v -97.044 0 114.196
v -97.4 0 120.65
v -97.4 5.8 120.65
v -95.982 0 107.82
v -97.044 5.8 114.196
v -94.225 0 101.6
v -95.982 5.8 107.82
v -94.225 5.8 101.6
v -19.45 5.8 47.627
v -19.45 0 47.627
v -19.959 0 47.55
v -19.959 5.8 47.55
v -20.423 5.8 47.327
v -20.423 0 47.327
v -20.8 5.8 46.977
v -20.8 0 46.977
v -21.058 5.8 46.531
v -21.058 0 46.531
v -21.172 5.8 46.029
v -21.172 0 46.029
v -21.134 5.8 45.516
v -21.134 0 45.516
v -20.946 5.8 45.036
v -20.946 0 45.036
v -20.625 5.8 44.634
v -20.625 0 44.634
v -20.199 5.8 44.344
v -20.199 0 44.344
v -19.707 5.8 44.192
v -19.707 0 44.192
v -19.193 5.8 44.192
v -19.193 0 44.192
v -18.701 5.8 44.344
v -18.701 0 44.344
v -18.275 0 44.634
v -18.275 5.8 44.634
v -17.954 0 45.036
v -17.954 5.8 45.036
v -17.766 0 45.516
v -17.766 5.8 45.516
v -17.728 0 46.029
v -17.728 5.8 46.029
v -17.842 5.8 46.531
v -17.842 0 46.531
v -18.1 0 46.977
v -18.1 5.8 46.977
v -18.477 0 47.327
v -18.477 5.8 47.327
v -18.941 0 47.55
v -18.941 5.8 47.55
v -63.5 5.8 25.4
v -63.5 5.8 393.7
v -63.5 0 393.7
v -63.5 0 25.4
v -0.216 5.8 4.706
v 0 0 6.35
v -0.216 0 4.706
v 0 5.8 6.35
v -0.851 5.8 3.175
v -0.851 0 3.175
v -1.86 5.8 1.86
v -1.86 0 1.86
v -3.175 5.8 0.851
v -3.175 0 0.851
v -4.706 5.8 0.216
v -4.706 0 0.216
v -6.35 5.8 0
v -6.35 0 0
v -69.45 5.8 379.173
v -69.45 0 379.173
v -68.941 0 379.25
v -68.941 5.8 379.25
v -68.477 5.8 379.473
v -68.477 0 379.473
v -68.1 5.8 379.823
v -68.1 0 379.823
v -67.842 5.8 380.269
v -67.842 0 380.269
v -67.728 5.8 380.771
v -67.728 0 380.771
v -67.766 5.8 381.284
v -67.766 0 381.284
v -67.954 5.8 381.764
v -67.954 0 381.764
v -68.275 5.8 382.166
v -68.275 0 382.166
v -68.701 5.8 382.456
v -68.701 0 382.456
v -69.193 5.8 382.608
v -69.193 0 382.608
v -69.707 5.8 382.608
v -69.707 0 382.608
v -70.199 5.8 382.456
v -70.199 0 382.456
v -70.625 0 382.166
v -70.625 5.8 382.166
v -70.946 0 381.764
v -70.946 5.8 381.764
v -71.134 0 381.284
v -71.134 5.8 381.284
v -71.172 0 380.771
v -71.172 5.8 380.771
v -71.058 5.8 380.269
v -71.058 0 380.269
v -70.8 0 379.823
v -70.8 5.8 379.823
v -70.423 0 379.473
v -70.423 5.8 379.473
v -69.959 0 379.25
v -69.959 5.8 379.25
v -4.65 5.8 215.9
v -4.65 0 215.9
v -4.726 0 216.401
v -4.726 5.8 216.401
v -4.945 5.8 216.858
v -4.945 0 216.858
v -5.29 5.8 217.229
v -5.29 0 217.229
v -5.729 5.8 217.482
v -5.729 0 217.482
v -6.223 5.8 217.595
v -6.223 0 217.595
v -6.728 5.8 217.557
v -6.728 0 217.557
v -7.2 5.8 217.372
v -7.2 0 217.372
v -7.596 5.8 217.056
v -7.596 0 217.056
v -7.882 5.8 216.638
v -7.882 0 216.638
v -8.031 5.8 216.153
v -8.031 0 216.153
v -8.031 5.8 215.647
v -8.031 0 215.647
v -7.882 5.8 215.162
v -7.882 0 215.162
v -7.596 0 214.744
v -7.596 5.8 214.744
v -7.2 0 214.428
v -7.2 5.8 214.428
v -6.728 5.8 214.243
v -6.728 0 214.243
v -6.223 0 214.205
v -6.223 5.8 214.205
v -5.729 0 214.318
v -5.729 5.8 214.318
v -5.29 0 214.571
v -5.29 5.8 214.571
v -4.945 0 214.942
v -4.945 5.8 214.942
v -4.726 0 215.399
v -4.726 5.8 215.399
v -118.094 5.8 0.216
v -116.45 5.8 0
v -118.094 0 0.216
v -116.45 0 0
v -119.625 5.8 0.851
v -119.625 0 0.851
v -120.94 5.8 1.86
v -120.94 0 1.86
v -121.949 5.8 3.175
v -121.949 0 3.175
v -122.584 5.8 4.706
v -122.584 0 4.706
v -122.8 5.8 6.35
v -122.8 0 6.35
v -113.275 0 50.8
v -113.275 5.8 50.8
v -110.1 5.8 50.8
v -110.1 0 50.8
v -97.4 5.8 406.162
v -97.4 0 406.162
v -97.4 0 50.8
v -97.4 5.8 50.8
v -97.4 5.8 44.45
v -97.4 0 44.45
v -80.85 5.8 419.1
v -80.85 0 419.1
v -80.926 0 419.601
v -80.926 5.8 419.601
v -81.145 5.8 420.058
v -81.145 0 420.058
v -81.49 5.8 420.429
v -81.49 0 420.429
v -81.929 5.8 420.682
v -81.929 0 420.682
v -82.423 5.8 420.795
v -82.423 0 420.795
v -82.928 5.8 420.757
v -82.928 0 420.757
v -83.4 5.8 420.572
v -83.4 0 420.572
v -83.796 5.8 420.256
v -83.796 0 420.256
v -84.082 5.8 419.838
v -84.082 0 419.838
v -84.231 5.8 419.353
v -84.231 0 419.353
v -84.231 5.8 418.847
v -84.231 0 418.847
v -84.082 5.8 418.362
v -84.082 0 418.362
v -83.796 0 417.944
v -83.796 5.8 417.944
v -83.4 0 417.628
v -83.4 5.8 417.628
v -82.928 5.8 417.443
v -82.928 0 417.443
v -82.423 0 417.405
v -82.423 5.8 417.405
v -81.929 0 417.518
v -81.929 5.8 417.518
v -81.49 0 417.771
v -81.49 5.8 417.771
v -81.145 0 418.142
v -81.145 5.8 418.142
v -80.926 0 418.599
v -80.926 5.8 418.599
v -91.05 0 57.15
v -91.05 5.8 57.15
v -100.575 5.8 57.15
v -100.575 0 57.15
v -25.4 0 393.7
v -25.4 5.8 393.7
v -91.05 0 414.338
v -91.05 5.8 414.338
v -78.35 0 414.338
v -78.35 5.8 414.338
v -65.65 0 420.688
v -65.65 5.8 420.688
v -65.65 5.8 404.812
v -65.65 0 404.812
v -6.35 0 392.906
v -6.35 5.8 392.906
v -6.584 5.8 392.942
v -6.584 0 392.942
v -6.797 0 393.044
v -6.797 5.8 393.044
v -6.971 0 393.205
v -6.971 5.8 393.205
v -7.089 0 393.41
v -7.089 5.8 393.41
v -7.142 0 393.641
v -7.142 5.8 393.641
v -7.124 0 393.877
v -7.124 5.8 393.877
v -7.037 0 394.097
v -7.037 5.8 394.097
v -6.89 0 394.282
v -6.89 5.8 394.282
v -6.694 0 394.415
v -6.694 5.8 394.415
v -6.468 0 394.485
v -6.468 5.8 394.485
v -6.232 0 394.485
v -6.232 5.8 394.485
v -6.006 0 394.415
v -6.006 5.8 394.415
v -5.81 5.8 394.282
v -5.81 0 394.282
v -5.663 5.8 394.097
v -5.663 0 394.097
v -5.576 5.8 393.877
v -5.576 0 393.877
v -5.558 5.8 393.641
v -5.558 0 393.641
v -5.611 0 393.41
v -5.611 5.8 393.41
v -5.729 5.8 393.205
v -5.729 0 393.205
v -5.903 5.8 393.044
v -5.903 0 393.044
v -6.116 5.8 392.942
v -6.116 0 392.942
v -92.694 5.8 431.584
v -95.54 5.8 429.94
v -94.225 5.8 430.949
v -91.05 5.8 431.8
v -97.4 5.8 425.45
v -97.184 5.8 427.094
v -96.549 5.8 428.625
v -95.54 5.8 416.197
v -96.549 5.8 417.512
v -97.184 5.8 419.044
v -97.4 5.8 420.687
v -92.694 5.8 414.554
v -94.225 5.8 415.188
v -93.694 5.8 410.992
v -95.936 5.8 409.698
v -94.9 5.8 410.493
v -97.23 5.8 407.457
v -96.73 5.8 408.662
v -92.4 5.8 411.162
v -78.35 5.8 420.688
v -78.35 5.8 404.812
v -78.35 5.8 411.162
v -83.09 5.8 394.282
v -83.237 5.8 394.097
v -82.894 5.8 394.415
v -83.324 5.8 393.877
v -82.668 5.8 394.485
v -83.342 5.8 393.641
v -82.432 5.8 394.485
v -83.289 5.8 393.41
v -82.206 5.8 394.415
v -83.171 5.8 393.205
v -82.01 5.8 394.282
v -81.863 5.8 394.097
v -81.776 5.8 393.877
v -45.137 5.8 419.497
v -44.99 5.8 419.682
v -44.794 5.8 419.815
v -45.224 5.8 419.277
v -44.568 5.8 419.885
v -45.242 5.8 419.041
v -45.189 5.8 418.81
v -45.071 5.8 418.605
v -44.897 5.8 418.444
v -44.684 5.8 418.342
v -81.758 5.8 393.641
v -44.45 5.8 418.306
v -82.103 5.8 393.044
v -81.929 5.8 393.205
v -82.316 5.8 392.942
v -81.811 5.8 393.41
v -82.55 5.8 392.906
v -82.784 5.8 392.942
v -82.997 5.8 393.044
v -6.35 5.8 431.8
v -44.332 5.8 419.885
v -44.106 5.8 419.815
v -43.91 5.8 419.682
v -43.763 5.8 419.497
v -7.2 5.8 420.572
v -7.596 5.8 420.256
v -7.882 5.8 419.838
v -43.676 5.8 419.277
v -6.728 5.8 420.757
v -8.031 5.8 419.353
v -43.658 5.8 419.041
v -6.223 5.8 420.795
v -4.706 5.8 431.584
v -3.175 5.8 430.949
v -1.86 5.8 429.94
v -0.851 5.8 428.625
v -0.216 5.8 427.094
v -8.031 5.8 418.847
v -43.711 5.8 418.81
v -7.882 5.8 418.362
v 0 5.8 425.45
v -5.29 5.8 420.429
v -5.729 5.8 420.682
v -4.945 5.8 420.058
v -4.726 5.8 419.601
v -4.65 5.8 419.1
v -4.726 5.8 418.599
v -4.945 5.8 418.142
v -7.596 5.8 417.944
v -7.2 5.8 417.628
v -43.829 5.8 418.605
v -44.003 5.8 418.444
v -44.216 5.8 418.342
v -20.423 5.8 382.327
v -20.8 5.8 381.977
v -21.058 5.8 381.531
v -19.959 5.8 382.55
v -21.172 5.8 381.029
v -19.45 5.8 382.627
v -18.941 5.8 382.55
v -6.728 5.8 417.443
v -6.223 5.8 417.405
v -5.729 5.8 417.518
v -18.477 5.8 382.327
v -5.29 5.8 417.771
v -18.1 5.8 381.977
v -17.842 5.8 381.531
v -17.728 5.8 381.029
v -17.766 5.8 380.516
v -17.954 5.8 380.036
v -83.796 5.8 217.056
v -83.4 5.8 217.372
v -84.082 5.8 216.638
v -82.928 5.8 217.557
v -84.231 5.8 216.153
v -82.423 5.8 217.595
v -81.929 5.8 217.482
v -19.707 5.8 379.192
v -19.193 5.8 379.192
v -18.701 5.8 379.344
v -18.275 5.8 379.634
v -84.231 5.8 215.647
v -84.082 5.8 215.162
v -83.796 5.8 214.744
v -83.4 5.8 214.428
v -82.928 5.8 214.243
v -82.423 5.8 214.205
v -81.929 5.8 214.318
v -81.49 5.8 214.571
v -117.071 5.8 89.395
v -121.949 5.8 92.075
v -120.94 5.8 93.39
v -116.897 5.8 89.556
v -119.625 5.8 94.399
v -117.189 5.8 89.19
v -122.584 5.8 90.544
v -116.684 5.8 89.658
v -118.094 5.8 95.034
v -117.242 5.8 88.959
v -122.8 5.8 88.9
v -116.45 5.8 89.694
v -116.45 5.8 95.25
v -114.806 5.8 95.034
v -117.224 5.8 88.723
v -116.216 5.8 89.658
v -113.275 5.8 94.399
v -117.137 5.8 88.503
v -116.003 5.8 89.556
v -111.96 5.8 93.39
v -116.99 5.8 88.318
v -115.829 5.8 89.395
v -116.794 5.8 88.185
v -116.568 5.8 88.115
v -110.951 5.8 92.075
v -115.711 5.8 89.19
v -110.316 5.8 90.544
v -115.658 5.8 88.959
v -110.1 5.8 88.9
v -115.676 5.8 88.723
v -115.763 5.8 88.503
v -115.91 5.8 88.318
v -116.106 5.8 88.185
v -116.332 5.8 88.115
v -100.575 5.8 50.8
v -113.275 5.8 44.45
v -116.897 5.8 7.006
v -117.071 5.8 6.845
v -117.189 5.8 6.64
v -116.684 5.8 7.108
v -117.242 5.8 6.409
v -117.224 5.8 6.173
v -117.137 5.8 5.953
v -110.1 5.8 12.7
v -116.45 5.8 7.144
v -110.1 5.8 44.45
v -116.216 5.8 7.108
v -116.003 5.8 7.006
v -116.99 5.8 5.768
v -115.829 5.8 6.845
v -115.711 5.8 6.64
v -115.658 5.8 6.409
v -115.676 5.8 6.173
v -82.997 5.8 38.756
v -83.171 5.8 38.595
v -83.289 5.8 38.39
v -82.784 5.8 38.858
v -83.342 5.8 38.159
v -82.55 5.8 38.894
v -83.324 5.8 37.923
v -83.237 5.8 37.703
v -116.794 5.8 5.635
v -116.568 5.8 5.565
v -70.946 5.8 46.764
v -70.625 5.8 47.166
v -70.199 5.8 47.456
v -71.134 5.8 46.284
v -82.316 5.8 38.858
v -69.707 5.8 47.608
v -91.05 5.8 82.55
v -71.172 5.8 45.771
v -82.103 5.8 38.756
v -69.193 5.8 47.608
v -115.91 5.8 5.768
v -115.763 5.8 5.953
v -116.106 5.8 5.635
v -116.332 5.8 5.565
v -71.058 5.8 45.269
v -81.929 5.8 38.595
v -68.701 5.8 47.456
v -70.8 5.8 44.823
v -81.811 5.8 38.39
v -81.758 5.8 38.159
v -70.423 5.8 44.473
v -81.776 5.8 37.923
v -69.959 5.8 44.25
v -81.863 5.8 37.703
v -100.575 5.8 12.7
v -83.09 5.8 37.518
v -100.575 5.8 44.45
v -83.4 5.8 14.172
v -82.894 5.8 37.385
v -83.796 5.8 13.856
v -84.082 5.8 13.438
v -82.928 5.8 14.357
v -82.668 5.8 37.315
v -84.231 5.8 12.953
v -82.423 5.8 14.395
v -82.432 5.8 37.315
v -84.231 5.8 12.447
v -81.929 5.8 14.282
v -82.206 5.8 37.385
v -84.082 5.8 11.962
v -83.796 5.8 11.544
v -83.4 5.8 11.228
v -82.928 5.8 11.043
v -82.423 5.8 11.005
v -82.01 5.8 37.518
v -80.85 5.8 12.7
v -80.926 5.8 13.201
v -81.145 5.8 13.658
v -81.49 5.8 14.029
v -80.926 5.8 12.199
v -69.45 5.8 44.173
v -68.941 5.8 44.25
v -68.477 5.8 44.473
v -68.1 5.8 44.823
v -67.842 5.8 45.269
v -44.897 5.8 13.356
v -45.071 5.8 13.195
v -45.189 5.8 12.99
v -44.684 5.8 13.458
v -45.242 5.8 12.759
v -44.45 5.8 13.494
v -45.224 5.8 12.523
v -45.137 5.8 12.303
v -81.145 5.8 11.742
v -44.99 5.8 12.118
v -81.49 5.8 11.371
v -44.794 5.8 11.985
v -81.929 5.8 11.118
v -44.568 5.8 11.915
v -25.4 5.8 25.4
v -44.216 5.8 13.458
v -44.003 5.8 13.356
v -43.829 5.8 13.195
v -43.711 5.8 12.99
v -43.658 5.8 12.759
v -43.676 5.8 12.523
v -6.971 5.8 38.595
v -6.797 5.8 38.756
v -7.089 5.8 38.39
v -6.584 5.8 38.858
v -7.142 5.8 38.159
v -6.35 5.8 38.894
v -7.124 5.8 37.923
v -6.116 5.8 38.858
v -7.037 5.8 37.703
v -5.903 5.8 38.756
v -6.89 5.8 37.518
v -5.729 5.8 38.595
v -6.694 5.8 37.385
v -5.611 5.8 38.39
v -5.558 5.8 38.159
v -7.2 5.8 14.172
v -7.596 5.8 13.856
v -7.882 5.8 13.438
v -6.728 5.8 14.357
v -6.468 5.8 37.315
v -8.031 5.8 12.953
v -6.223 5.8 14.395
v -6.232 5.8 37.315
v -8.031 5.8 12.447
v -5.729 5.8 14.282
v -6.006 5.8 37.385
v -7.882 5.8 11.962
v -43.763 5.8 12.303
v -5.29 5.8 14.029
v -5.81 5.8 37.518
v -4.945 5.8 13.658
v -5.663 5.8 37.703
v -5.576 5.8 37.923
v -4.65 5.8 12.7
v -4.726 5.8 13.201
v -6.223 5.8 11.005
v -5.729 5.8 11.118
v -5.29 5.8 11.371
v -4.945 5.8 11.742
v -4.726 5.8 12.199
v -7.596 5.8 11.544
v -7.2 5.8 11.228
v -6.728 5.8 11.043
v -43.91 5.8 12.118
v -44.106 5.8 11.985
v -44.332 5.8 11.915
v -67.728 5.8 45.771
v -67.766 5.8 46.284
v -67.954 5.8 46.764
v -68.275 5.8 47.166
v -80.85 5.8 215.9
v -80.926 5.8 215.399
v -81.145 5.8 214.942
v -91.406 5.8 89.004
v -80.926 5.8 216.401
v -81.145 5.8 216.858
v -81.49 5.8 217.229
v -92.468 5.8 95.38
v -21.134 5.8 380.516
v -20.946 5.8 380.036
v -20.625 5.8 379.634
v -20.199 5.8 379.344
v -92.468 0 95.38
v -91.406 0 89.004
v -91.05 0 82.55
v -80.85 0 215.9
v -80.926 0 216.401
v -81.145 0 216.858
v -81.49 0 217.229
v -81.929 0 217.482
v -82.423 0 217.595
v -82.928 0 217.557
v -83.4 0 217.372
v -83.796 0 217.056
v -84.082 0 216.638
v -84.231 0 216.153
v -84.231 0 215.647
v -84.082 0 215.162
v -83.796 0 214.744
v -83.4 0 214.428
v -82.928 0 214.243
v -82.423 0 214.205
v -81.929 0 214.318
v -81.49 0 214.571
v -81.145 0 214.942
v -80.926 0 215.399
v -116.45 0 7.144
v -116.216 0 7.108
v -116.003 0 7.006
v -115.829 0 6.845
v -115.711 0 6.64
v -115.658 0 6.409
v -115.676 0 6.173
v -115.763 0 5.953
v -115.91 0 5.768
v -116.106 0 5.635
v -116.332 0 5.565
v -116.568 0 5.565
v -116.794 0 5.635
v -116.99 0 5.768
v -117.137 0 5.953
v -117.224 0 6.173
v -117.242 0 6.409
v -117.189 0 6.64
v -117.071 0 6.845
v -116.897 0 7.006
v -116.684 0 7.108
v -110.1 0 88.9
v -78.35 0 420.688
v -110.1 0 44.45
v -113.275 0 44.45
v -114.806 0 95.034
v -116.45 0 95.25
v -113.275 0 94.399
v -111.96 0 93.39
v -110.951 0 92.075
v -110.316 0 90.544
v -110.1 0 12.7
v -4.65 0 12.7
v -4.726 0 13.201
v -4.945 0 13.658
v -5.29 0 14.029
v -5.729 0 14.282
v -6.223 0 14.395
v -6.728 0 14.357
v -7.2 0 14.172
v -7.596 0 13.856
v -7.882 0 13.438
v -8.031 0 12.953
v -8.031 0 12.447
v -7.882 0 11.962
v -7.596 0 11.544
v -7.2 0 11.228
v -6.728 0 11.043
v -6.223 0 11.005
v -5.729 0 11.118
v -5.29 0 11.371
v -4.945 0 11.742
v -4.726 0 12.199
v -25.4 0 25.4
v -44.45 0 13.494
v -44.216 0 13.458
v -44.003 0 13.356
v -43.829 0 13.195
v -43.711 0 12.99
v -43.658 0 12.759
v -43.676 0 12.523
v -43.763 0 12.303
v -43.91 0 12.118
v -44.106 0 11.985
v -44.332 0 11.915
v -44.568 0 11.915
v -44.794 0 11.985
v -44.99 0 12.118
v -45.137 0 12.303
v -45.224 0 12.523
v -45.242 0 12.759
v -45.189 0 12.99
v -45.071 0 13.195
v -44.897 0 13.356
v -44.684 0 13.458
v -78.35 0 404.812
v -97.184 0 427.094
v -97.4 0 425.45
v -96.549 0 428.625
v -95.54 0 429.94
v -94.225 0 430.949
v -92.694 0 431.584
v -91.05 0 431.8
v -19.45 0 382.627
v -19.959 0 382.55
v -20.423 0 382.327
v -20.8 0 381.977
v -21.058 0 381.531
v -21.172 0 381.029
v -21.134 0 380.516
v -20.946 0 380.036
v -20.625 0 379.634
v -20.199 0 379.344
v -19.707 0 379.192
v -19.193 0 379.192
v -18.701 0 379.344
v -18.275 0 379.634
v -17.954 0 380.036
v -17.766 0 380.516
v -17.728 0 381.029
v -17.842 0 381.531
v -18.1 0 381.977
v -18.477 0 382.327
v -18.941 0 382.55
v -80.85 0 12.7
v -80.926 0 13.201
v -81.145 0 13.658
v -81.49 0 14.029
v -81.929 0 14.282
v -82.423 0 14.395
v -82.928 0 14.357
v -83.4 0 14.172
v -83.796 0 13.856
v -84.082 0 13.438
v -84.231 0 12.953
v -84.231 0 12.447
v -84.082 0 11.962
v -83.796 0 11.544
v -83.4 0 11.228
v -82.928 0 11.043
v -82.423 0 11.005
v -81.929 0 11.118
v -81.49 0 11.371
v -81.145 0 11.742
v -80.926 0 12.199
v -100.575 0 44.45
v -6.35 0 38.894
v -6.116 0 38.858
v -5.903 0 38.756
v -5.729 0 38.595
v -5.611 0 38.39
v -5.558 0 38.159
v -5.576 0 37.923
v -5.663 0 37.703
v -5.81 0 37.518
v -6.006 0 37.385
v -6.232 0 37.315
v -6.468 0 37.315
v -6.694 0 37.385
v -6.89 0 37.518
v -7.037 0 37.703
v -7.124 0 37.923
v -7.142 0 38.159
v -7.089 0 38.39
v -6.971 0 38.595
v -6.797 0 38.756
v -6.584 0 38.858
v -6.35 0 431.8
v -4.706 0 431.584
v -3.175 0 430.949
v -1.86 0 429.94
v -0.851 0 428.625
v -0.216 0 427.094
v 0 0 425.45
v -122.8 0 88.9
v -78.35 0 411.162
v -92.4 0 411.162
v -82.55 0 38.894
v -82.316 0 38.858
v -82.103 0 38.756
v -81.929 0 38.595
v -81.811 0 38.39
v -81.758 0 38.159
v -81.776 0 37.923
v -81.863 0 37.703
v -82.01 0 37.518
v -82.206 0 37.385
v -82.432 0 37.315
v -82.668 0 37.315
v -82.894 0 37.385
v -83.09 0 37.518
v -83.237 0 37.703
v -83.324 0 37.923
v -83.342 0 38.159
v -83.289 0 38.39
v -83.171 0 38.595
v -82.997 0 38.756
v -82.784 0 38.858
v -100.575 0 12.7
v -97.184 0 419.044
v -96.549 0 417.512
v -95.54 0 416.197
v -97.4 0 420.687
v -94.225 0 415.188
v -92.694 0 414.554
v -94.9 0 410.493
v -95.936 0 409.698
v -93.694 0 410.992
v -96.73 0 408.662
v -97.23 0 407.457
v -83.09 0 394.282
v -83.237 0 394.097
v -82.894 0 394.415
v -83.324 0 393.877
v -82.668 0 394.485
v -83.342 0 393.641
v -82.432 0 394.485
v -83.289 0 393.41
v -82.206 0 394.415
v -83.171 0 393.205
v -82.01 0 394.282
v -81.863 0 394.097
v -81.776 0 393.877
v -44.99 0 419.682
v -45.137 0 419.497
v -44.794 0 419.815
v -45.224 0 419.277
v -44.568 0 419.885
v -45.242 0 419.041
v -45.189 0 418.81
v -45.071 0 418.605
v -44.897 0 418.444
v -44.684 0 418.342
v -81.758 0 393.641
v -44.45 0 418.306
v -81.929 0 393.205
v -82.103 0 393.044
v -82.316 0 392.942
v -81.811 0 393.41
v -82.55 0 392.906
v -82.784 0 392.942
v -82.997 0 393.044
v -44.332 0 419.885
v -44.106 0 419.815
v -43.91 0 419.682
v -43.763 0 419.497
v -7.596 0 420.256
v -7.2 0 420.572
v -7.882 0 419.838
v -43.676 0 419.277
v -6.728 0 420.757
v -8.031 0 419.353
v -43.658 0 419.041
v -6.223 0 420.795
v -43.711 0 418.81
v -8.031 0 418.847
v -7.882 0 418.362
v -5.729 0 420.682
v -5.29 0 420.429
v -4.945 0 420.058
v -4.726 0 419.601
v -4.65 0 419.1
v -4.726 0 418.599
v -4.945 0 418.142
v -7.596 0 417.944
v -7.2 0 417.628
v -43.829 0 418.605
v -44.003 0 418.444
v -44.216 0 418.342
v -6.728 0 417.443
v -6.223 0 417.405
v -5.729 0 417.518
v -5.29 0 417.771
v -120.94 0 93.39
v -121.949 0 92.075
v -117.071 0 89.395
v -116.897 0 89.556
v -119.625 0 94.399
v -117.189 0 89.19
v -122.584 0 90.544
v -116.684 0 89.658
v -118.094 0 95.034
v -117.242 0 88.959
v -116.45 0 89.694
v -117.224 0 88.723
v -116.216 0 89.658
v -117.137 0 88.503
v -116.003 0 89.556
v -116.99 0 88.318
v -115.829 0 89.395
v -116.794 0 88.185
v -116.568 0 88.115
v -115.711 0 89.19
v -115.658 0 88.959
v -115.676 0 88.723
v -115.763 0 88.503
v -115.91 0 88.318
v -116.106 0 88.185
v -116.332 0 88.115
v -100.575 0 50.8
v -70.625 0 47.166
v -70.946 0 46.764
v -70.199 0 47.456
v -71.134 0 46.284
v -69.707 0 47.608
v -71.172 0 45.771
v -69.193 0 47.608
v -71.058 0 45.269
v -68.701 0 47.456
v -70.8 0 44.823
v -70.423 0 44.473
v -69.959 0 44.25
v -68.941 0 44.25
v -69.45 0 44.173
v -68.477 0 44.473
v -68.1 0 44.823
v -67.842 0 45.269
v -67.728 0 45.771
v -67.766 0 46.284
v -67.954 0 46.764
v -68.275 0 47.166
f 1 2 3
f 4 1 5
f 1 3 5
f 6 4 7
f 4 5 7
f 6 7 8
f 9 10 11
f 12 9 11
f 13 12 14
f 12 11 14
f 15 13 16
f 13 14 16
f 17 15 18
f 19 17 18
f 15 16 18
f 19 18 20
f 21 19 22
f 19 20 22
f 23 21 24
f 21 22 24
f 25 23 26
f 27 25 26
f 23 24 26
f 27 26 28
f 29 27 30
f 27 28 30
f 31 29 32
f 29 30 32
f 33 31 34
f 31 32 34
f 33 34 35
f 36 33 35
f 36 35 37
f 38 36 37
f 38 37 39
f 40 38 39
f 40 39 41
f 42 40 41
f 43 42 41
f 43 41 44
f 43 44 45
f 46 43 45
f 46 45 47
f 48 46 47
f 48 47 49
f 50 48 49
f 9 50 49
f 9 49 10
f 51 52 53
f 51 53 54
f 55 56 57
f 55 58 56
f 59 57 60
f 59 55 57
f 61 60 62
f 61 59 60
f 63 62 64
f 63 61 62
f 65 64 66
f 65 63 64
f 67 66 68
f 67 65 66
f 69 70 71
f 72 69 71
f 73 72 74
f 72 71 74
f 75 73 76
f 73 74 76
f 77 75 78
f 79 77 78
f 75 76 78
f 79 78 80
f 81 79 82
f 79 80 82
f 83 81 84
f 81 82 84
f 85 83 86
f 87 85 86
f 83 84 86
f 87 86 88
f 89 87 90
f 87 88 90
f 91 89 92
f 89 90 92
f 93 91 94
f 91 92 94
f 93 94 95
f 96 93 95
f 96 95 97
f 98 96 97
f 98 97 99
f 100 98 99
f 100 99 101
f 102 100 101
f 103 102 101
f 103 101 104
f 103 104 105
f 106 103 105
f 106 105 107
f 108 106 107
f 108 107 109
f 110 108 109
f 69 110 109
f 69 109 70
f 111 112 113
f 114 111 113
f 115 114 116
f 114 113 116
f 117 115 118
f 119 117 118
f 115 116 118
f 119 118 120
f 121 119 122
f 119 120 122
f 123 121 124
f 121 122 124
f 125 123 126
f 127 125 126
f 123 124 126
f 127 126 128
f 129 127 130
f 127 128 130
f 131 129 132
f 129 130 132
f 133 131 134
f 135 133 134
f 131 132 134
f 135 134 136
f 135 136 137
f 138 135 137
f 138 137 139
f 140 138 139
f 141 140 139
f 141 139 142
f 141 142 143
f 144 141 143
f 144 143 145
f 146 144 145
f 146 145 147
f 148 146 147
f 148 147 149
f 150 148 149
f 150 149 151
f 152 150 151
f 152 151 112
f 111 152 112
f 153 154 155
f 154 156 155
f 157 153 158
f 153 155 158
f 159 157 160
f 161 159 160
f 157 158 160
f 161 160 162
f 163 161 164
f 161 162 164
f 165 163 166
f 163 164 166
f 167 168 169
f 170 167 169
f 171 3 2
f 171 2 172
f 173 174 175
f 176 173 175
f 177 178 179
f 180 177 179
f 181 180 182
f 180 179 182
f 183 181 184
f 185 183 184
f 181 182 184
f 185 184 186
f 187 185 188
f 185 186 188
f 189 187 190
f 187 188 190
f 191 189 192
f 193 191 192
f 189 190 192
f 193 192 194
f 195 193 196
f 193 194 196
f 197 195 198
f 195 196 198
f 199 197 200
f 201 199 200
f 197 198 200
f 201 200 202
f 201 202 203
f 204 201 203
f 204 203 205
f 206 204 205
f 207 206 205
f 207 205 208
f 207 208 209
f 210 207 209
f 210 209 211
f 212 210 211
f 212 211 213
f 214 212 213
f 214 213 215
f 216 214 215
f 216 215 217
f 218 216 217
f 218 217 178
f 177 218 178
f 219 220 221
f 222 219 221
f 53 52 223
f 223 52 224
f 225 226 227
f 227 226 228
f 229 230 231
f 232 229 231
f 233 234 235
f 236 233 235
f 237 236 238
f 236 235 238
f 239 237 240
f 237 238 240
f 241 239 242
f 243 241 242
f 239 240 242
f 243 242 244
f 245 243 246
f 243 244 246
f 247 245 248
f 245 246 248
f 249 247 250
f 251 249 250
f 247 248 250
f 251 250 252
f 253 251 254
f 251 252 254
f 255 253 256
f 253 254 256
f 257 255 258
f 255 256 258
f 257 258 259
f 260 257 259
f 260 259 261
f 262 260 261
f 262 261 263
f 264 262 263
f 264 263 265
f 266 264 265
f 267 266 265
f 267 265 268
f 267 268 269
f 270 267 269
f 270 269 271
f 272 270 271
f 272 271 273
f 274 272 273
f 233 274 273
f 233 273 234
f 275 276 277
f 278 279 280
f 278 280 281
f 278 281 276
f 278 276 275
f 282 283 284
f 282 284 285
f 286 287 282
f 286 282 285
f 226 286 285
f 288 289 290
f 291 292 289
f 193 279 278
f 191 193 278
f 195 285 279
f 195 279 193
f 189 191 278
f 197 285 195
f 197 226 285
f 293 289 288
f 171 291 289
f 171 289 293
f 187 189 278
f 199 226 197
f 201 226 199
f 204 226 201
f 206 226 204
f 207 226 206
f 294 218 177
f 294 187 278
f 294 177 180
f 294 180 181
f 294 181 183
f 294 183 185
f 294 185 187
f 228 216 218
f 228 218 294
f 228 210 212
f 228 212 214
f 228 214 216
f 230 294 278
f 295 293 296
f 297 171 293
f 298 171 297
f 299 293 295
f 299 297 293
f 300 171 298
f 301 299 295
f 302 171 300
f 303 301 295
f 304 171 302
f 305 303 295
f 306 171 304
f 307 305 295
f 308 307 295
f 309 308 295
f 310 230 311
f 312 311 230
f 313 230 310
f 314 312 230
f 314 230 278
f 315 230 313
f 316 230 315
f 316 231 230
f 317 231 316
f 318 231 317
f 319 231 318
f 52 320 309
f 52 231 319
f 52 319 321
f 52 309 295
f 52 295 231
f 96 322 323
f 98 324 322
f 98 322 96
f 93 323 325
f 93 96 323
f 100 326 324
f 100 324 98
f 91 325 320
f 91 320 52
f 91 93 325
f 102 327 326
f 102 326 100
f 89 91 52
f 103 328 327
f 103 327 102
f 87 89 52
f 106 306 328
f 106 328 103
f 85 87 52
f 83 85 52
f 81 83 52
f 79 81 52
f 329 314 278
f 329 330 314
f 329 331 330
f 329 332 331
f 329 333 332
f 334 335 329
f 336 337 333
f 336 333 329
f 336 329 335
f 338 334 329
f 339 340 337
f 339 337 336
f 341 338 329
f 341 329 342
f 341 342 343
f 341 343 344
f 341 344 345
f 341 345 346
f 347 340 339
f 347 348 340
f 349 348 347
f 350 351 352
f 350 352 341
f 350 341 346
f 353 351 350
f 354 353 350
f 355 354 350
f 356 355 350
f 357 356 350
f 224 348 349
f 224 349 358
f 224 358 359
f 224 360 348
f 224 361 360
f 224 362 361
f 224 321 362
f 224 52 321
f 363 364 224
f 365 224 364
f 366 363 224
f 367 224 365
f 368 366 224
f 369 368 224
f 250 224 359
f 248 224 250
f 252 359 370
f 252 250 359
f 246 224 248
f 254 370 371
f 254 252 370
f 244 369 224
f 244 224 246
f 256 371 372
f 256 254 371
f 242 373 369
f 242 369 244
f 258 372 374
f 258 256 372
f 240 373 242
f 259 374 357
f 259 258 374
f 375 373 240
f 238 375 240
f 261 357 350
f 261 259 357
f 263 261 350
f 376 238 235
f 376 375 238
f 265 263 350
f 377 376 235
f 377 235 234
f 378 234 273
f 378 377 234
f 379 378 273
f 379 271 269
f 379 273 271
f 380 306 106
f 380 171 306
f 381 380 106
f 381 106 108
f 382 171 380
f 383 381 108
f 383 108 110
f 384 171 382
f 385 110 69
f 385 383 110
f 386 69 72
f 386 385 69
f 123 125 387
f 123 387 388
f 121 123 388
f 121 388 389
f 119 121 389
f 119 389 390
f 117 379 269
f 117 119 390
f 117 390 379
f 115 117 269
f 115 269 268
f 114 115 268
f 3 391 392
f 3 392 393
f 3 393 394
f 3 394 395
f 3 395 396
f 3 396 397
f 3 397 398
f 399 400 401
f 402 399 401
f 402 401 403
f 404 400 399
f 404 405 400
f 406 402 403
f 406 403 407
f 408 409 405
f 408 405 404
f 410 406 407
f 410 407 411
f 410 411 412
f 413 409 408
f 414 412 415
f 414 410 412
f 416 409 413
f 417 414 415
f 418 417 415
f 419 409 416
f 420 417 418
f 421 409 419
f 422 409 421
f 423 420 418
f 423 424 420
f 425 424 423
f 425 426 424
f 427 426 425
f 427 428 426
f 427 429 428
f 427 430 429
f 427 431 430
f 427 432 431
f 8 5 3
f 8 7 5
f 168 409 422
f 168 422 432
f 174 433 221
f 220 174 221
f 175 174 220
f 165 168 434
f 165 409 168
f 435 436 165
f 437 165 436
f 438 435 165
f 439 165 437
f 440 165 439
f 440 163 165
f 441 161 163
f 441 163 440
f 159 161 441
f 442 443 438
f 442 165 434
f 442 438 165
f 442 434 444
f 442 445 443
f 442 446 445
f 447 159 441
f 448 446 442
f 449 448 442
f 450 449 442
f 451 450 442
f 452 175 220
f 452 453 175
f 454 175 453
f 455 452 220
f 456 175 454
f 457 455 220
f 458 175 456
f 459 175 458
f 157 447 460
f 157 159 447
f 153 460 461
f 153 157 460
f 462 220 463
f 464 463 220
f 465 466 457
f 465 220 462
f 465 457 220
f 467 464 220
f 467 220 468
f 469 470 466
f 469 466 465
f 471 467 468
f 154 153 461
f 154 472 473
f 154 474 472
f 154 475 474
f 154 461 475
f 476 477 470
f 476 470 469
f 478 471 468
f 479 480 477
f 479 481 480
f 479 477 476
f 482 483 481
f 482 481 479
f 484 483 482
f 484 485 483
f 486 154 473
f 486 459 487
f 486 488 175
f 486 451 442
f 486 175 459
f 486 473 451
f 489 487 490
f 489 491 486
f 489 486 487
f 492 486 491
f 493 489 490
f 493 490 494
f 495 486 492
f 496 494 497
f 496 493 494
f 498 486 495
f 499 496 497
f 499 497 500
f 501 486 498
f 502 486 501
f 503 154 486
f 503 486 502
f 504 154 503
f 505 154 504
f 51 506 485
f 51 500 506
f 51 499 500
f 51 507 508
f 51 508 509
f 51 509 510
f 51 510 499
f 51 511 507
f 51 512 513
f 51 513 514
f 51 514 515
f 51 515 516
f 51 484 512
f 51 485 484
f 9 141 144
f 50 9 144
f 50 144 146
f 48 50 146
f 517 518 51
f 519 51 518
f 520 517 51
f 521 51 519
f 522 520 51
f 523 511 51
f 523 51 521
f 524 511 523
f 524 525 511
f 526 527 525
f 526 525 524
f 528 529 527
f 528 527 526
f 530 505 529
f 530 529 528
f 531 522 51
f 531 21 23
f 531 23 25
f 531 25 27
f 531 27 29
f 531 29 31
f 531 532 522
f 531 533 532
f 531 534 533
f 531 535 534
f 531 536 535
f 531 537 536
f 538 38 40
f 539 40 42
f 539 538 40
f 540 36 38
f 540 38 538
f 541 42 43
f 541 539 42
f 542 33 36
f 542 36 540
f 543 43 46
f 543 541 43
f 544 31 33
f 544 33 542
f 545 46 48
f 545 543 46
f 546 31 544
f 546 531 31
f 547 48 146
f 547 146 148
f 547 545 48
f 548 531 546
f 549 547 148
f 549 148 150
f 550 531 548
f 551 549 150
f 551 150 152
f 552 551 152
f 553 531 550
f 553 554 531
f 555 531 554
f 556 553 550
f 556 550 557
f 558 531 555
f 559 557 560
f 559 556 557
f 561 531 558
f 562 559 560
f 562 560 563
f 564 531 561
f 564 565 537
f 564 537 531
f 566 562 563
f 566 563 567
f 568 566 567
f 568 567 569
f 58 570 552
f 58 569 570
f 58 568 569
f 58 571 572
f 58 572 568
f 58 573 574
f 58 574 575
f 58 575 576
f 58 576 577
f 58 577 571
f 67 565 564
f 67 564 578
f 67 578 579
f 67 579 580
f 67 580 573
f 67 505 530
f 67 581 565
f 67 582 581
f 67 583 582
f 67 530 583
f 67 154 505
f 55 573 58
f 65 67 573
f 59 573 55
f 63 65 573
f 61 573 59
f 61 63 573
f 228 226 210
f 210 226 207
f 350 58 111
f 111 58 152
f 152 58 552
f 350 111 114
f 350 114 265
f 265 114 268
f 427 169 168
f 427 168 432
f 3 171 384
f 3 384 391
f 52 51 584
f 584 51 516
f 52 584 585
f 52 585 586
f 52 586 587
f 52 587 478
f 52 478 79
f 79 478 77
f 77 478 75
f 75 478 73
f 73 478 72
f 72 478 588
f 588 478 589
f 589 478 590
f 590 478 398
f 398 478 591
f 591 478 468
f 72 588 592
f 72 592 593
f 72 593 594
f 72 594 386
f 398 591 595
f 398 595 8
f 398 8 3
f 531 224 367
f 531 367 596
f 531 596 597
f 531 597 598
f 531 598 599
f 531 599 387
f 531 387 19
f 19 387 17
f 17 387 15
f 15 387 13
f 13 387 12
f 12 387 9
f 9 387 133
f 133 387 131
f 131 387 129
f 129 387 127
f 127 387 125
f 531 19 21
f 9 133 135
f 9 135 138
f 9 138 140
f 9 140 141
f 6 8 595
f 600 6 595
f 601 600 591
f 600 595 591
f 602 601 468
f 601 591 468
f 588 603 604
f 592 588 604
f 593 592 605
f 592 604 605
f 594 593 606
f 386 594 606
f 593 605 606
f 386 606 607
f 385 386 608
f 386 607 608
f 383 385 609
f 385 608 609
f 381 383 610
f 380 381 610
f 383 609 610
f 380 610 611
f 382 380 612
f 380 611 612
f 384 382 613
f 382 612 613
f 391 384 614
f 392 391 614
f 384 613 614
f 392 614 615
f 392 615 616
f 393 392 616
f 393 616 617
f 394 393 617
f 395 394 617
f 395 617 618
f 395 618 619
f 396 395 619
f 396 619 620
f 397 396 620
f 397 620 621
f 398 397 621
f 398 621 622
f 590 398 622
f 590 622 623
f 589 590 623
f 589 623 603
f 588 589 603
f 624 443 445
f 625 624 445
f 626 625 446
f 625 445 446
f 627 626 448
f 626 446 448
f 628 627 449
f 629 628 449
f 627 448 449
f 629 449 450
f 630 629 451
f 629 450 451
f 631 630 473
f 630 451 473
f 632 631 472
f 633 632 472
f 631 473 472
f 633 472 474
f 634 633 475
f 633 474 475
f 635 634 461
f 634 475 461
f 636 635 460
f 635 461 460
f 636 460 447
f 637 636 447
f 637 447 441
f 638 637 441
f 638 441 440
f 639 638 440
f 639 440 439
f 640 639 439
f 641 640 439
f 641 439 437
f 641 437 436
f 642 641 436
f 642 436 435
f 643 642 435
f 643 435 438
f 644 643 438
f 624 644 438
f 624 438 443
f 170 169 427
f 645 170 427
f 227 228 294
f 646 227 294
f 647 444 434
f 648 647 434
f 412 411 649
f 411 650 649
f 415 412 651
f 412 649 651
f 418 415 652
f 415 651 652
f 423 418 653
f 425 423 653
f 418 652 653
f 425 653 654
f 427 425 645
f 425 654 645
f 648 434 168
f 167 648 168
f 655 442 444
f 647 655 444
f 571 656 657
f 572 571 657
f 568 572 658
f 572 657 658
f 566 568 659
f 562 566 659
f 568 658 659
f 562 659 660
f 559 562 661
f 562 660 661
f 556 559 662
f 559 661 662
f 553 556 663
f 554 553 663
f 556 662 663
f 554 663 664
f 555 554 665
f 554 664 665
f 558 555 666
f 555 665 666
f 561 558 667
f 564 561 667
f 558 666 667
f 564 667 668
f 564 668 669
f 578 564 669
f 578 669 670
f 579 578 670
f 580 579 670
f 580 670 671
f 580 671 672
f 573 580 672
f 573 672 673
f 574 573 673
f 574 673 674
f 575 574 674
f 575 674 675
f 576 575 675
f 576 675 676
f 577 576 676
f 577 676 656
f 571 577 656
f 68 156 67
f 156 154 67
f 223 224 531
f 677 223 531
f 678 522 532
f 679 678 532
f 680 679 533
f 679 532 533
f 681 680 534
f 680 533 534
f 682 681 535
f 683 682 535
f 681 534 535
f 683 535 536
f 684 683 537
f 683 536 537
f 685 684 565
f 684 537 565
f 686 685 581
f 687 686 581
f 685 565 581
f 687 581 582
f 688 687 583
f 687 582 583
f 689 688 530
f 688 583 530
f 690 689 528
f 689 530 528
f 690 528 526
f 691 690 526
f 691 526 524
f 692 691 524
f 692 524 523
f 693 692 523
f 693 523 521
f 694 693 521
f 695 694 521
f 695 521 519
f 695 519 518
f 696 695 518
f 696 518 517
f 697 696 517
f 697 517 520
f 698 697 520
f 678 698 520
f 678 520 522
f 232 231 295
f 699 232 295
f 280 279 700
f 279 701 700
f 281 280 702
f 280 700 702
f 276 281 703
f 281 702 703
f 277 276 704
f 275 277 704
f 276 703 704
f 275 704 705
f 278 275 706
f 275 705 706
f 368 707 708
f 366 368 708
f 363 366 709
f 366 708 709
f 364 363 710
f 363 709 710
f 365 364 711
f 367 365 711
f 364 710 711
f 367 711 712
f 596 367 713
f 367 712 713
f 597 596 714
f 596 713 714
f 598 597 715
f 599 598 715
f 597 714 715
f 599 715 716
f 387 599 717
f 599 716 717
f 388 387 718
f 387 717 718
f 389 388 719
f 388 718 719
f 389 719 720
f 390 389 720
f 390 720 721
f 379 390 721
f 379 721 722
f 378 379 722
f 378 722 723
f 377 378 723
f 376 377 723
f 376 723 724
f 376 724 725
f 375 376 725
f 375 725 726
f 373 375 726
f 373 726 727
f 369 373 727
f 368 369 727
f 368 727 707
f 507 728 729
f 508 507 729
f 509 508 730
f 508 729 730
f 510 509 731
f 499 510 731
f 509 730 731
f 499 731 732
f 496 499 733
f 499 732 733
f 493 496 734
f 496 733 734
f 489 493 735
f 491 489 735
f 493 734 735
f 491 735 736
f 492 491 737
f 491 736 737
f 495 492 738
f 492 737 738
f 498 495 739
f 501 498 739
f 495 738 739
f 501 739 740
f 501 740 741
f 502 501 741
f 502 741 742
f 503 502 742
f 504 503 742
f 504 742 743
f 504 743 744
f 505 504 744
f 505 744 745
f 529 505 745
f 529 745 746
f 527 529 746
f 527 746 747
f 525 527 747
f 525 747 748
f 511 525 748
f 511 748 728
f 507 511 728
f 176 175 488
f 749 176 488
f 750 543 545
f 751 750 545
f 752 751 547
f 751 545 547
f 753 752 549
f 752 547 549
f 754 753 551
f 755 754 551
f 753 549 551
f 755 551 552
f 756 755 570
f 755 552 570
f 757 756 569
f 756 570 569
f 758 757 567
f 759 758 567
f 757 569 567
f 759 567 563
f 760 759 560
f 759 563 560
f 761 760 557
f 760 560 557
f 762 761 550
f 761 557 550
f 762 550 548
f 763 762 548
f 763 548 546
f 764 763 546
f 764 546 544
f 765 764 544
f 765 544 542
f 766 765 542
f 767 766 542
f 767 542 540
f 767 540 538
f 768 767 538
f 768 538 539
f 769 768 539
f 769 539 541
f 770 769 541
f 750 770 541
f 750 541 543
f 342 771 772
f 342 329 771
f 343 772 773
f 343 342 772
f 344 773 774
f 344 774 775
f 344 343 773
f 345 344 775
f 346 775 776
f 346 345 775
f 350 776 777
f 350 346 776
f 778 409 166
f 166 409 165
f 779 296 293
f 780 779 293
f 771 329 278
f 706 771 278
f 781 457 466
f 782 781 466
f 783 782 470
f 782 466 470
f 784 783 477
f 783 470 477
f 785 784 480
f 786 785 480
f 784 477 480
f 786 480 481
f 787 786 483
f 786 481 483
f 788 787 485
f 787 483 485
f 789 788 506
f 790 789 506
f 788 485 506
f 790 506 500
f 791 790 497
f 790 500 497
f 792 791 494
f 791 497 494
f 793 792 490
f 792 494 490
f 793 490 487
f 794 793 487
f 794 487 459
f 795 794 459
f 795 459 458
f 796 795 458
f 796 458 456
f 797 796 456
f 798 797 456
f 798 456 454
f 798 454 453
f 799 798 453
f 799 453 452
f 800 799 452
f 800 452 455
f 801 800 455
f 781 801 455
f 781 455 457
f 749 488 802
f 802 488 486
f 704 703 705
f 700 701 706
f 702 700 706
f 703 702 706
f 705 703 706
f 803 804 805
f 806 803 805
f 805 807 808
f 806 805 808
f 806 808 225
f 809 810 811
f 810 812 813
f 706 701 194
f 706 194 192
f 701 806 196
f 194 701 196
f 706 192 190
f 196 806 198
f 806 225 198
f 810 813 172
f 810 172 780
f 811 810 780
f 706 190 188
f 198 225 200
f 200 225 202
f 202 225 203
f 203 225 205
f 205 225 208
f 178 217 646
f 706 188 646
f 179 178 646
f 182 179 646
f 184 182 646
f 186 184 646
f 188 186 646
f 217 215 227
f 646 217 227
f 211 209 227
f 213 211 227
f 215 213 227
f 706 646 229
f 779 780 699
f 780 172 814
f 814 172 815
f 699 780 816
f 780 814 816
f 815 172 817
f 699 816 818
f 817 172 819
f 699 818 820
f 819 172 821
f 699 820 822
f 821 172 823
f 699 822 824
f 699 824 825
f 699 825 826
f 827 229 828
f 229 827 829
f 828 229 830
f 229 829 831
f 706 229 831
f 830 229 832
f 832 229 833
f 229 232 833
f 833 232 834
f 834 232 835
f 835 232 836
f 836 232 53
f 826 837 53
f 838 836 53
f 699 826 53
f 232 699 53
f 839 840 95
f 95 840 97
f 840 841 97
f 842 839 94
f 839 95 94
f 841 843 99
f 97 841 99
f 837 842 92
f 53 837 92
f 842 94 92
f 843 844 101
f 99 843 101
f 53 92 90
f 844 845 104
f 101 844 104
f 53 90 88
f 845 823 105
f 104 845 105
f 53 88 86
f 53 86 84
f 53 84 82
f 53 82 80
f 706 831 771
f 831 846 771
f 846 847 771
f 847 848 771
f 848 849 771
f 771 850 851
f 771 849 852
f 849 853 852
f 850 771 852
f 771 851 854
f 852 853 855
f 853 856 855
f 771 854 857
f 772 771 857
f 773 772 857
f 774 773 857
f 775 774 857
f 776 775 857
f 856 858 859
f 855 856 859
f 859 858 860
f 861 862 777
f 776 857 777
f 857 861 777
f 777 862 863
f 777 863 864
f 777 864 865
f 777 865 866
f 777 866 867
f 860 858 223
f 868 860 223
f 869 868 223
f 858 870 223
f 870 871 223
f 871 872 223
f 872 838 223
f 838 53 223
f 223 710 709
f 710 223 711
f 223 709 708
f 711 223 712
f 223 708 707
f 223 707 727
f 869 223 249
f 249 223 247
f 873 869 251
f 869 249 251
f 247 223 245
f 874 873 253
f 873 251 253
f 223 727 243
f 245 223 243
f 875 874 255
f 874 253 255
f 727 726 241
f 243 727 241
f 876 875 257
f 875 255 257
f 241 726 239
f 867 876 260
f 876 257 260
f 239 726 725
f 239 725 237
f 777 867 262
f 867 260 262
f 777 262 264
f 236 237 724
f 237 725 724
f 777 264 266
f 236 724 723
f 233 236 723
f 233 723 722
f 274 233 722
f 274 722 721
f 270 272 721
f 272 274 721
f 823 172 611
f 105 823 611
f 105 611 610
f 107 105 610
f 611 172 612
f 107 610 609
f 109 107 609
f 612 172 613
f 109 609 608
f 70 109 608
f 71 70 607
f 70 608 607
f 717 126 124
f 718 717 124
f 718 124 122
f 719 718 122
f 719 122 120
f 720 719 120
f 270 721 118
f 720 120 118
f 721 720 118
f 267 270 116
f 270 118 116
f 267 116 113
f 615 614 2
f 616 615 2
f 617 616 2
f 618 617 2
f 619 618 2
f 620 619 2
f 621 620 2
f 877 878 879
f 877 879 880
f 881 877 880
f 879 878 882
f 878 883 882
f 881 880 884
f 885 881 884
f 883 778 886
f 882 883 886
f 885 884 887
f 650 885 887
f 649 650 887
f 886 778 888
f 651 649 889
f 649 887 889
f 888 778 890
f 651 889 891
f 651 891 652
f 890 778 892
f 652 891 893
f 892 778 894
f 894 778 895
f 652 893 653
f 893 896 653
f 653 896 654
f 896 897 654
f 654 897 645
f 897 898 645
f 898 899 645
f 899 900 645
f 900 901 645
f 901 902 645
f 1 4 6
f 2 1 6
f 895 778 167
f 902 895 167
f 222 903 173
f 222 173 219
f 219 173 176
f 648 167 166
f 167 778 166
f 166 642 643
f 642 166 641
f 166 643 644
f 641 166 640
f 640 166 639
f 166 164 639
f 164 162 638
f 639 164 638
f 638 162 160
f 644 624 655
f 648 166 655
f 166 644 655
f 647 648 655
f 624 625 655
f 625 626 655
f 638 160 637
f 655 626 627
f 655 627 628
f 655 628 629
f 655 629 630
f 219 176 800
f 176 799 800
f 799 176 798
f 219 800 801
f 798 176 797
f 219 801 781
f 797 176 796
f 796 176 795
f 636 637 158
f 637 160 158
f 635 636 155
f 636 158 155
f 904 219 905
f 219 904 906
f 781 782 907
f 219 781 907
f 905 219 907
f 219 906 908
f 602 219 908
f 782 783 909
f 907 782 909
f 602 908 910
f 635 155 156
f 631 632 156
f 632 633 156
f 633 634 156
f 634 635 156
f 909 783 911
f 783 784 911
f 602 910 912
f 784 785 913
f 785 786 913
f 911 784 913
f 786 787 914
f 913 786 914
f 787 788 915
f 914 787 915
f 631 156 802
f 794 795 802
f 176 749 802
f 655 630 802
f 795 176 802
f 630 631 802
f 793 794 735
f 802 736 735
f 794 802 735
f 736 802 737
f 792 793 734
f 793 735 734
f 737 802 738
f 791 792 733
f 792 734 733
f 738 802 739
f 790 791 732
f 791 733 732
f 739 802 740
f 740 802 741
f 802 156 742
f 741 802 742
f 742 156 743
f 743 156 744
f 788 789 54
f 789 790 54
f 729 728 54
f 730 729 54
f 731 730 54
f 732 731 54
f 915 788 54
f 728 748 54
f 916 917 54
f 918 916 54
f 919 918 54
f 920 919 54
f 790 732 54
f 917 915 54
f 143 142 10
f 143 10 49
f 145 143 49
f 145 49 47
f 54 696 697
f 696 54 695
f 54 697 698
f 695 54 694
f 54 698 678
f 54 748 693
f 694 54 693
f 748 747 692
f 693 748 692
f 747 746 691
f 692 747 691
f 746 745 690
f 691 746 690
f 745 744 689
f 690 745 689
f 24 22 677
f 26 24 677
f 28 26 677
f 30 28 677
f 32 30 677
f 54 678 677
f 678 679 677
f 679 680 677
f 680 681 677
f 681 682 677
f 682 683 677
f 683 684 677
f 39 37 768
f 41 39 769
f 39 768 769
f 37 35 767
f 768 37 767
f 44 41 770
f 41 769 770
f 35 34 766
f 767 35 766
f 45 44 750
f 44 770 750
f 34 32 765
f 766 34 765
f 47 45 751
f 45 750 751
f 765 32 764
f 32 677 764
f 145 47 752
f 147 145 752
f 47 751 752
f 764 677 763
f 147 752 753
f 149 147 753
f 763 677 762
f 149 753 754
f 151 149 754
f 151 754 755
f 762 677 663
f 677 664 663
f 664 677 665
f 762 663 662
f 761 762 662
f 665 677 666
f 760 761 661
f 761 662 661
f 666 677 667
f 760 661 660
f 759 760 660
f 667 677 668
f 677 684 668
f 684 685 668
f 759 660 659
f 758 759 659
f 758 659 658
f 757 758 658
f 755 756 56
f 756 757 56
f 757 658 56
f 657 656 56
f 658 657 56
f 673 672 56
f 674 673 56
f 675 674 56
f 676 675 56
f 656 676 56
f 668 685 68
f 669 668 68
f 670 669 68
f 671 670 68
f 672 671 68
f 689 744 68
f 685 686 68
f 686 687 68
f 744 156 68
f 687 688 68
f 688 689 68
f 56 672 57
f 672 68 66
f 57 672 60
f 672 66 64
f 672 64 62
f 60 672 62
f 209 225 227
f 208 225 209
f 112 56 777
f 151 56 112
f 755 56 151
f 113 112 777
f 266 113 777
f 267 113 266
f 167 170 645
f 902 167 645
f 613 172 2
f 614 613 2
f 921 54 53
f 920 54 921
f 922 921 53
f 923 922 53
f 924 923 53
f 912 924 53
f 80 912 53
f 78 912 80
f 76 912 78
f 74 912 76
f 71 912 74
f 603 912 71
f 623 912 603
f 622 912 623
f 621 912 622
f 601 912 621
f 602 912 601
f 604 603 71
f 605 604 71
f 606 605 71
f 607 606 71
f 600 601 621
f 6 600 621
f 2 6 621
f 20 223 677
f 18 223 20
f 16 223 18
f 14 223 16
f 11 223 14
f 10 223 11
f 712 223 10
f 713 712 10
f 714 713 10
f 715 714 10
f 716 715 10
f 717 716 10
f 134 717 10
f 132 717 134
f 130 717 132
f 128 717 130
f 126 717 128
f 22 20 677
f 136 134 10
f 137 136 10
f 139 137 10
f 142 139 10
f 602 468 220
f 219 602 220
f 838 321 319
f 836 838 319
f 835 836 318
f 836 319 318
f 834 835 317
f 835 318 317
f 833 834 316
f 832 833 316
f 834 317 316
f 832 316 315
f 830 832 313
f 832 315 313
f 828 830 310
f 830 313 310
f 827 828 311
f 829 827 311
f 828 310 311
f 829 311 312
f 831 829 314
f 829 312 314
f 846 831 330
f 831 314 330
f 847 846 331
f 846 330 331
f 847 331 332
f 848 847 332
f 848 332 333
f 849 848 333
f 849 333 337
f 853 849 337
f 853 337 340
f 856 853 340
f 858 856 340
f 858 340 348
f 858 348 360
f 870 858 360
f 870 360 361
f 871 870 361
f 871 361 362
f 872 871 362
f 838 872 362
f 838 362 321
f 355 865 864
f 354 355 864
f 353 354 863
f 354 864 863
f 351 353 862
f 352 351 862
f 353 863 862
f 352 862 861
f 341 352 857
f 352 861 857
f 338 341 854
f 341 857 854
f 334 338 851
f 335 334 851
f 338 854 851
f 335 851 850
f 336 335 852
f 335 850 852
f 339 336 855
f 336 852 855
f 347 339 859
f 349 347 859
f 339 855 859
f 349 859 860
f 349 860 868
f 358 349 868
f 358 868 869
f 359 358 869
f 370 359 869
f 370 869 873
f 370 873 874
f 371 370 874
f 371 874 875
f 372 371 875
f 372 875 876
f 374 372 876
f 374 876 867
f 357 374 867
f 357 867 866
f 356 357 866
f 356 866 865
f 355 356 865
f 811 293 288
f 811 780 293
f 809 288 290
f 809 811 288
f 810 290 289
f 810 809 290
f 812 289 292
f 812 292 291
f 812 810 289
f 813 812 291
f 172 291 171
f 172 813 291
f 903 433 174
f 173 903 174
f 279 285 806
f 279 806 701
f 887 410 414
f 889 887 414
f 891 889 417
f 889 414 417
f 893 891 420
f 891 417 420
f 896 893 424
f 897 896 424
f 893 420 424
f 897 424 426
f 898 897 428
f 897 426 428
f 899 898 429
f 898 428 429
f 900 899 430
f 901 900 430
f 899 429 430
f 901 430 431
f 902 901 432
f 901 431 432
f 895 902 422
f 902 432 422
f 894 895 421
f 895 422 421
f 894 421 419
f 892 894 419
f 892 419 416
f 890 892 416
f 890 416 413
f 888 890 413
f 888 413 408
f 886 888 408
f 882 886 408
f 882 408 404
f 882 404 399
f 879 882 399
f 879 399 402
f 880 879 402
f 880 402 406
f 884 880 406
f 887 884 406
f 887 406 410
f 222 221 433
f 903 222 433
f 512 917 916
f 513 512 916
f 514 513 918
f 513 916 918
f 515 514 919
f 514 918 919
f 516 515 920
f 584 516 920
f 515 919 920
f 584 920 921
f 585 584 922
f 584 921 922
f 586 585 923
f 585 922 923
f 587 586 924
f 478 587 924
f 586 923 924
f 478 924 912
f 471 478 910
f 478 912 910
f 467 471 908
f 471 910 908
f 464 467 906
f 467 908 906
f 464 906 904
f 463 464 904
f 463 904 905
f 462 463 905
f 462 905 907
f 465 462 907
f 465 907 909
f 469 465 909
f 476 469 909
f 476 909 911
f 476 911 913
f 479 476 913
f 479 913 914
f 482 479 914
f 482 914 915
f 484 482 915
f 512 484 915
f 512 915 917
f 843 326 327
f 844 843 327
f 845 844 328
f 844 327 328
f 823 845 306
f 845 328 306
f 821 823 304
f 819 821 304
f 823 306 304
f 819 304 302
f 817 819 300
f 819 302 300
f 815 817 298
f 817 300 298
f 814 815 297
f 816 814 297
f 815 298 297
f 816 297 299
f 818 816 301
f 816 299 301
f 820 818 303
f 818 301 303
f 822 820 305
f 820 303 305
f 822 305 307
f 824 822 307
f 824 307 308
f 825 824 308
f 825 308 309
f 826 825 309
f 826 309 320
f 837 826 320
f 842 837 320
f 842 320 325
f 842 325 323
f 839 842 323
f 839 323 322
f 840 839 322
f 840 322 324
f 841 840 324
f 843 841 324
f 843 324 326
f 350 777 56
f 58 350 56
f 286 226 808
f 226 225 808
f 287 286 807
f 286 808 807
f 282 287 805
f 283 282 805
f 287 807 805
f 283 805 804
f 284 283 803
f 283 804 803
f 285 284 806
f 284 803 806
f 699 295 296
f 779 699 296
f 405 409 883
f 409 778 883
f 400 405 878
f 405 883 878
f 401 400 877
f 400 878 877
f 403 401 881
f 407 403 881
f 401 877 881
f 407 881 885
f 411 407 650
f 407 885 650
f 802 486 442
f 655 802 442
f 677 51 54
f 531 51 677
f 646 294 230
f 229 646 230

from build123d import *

# Parameters (mm, degrees)
SKETCH1_W            = 88.9
SKETCH1_H            = 431.8
BOSS_EXTRUDE1_DEPTH  = 5.8
M3_CLEARANCE_HOLE1_D = 3.4
SKETCH2_W            = 38.1
SKETCH2_H            = 368.3
CUT_EXTRUDE1_DEPTH   = 441.89464728
SKETCH3_W            = 8.5
SKETCH3_H            = 431.8
BOSS_EXTRUDE2_DEPTH  = 5.8
SKETCH7_R            = 0.79375
CUT_EXTRUDE2_DEPTH   = 443.68684191
SKETCH9_W            = 25.4
SKETCH9_H            = 95.25
BOSS_EXTRUDE3_DEPTH  = 5.8
CUT_EXTRUDE3_DEPTH   = 449.959597291
SKETCH10_R           = 0.79375
CUT_EXTRUDE4_DEPTH   = 449.959597291
CUT_EXTRUDE5_DEPTH   = 449.959597291
FILLET1_R            = 5
FILLET2_R            = 6.35
SKETCH12_R           = 1.7272
CUT_EXTRUDE6_DEPTH   = 449.959597291


with BuildPart() as part:
    # Sketch1 → Boss-Extrude1 (new body)
    with BuildSketch(Plane(origin=(0, 0, 0), x_dir=(1, 0, 0), z_dir=(0, 1, 0))):
        with Locations((-44.45, -215.9)):
            Rectangle(SKETCH1_W, SKETCH1_H)
    extrude(amount=BOSS_EXTRUDE1_DEPTH)

    # M3 Clearance Hole1 (through all)
    with Locations(Plane(origin=(0, 5.8, 0), x_dir=(-1, 0, 0), z_dir=(0, 1, 0))):
        with Locations((82.55, 12.7), (6.35, 12.7), (6.35, 419.1), (82.55, 419.1), (82.55, 215.9), (6.35, 215.9)):
            Hole(M3_CLEARANCE_HOLE1_D / 2)

    # Sketch2 → Cut-Extrude1 (cut, through all)
    with BuildSketch(Plane(origin=(0, 5.8, 0), x_dir=(1, 0, 0), z_dir=(0, 1, 0))):
        with Locations((-44.45, -209.55)):
            Rectangle(SKETCH2_W, SKETCH2_H)
    extrude(amount=-CUT_EXTRUDE1_DEPTH, mode=Mode.SUBTRACT)

    # Sketch3 → Boss-Extrude2 (add, through all)
    with BuildSketch(Plane(origin=(0, 5.8, 0), x_dir=(-1, 0, 0), z_dir=(0, 1, 0))):
        with Locations((93.15, 215.9)):
            Rectangle(SKETCH3_W, SKETCH3_H)
    extrude(amount=-BOSS_EXTRUDE2_DEPTH)

    # Sketch7 → Cut-Extrude2 (cut, through all)
    with BuildSketch(Plane(origin=(0, 5.8, 0), x_dir=(1, 0, 0), z_dir=(0, 1, 0))):
        with Locations(Location((-44.45, -12.7, 0), (0, 0, 270))):
            Circle(SKETCH7_R)
        with Locations(Location((-82.55, -38.1, 0), (0, 0, 270))):
            Circle(SKETCH7_R)
        with Locations(Location((-6.35, -38.1, 0), (0, 0, 270))):
            Circle(SKETCH7_R)
        with Locations(Location((-6.35, -393.7, 0), (0, 0, 90))):
            Circle(SKETCH7_R)
        with Locations(Location((-82.55, -393.7, 0), (0, 0, 90))):
            Circle(SKETCH7_R)
        with Locations(Location((-44.45, -419.1, 0), (0, 0, 90))):
            Circle(SKETCH7_R)
    extrude(amount=-CUT_EXTRUDE2_DEPTH, mode=Mode.SUBTRACT)

    # Sketch9 → Boss-Extrude3 (add, through all)
    with BuildSketch(Plane(origin=(0, 5.8, 0), x_dir=(1, 0, 0), z_dir=(0, 1, 0))):
        with Locations((-110.1, -47.625)):
            Rectangle(SKETCH9_W, SKETCH9_H)
    extrude(amount=-BOSS_EXTRUDE3_DEPTH)

    # Sketch8 → Cut-Extrude3 (cut, through all)
    with BuildSketch(Plane(origin=(0, 5.8, 0), x_dir=(1, 0, 0), z_dir=(0, 1, 0))):
        with BuildLine():
            Line((-110.1, -44.45), (-113.275, -44.45))
            Line((-113.275, -44.45), (-113.275, -50.8))
            Line((-113.275, -50.8), (-110.1, -50.8))
            Line((-110.1, -50.8), (-110.1, -95.25))
            Line((-110.1, -95.25), (-97.4, -95.25))
            Line((-97.4, -95.25), (-97.4, -120.65))
            ThreePointArc((-97.4, -120.65), (-96.600813101, -110.993614483), (-94.225, -101.6))
            ThreePointArc((-94.225, -101.6), (-91.849186899, -92.206385517), (-91.05, -82.55))
            Line((-91.05, -82.55), (-91.05, -57.15))
            Line((-91.05, -57.15), (-100.575, -57.15))
            Line((-100.575, -57.15), (-100.575, -50.8))
            Line((-100.575, -50.8), (-97.4, -50.8))
            Line((-97.4, -50.8), (-97.4, -44.45))
            Line((-97.4, -44.45), (-100.575, -44.45))
            Line((-100.575, -44.45), (-100.575, -12.7))
            Line((-100.575, -12.7), (-110.1, -12.7))
            Line((-110.1, -12.7), (-110.1, -44.45))
        make_face()
    extrude(amount=-CUT_EXTRUDE3_DEPTH, mode=Mode.SUBTRACT)

    # Sketch10 → Cut-Extrude4 (cut, through all)
    with BuildSketch(Plane(origin=(0, 5.8, 0), x_dir=(1, 0, 0), z_dir=(0, 1, 0))):
        with Locations(Location((-116.45, -88.9, 0), (0, 0, 270))):
            Circle(SKETCH10_R)
        with Locations(Location((-116.45, -6.35, 0), (0, 0, 270))):
            Circle(SKETCH10_R)
    extrude(amount=-CUT_EXTRUDE4_DEPTH, mode=Mode.SUBTRACT)

    # Sketch11 → Cut-Extrude5 (cut, through all)
    with BuildSketch(Plane(origin=(0, 5.8, 0), x_dir=(1, 0, 0), z_dir=(0, 1, 0))):
        Polygon((-97.4, -414.3375), (-78.35, -414.3375), (-78.35, -420.6875), (-65.65, -420.6875), (-65.65, -404.8125), (-78.35, -404.8125), (-78.35, -411.1625), (-97.4, -411.1625), align=None)
    extrude(amount=-CUT_EXTRUDE5_DEPTH, mode=Mode.SUBTRACT)

    # Fillet1
    fillet1_edges = [part.edges().sort_by_distance(p)[0] for p in [
        (-97.4, 2.9, 411.1625),
    ]]
    fillet(fillet1_edges, radius=FILLET1_R)

    # Fillet2
    fillet2_edges = [part.edges().sort_by_distance(p)[0] for p in [
        (0, 2.9, 431.8),
        (-97.4, 2.9, 414.3375),
        (-97.4, 2.9, 431.8),
        (-122.8, 2.9, 95.25),
        (0, 2.9, 0),
        (-122.8, 2.9, 0),
        (-110.1, 2.9, 95.25),
    ]]
    fillet(fillet2_edges, radius=FILLET2_R - 0.0001)  # a hair under: the kernel refuses the full size

    # Sketch12 → Cut-Extrude6 (cut, through all)
    with BuildSketch(Plane.XZ):
        with Locations(Location((-69.45, 380.9, 0), (0, 0, 270))):
            Circle(SKETCH12_R)
        with Locations(Location((-19.45, 380.9, 0), (0, 0, 90))):
            Circle(SKETCH12_R)
        with Locations(Location((-69.45, 45.9, 0), (0, 0, 270))):
            Circle(SKETCH12_R)
        with Locations(Location((-19.45, 45.9, 0), (0, 0, 90))):
            Circle(SKETCH12_R)
    extrude(amount=-CUT_EXTRUDE6_DEPTH, mode=Mode.SUBTRACT)


solid = part.part
